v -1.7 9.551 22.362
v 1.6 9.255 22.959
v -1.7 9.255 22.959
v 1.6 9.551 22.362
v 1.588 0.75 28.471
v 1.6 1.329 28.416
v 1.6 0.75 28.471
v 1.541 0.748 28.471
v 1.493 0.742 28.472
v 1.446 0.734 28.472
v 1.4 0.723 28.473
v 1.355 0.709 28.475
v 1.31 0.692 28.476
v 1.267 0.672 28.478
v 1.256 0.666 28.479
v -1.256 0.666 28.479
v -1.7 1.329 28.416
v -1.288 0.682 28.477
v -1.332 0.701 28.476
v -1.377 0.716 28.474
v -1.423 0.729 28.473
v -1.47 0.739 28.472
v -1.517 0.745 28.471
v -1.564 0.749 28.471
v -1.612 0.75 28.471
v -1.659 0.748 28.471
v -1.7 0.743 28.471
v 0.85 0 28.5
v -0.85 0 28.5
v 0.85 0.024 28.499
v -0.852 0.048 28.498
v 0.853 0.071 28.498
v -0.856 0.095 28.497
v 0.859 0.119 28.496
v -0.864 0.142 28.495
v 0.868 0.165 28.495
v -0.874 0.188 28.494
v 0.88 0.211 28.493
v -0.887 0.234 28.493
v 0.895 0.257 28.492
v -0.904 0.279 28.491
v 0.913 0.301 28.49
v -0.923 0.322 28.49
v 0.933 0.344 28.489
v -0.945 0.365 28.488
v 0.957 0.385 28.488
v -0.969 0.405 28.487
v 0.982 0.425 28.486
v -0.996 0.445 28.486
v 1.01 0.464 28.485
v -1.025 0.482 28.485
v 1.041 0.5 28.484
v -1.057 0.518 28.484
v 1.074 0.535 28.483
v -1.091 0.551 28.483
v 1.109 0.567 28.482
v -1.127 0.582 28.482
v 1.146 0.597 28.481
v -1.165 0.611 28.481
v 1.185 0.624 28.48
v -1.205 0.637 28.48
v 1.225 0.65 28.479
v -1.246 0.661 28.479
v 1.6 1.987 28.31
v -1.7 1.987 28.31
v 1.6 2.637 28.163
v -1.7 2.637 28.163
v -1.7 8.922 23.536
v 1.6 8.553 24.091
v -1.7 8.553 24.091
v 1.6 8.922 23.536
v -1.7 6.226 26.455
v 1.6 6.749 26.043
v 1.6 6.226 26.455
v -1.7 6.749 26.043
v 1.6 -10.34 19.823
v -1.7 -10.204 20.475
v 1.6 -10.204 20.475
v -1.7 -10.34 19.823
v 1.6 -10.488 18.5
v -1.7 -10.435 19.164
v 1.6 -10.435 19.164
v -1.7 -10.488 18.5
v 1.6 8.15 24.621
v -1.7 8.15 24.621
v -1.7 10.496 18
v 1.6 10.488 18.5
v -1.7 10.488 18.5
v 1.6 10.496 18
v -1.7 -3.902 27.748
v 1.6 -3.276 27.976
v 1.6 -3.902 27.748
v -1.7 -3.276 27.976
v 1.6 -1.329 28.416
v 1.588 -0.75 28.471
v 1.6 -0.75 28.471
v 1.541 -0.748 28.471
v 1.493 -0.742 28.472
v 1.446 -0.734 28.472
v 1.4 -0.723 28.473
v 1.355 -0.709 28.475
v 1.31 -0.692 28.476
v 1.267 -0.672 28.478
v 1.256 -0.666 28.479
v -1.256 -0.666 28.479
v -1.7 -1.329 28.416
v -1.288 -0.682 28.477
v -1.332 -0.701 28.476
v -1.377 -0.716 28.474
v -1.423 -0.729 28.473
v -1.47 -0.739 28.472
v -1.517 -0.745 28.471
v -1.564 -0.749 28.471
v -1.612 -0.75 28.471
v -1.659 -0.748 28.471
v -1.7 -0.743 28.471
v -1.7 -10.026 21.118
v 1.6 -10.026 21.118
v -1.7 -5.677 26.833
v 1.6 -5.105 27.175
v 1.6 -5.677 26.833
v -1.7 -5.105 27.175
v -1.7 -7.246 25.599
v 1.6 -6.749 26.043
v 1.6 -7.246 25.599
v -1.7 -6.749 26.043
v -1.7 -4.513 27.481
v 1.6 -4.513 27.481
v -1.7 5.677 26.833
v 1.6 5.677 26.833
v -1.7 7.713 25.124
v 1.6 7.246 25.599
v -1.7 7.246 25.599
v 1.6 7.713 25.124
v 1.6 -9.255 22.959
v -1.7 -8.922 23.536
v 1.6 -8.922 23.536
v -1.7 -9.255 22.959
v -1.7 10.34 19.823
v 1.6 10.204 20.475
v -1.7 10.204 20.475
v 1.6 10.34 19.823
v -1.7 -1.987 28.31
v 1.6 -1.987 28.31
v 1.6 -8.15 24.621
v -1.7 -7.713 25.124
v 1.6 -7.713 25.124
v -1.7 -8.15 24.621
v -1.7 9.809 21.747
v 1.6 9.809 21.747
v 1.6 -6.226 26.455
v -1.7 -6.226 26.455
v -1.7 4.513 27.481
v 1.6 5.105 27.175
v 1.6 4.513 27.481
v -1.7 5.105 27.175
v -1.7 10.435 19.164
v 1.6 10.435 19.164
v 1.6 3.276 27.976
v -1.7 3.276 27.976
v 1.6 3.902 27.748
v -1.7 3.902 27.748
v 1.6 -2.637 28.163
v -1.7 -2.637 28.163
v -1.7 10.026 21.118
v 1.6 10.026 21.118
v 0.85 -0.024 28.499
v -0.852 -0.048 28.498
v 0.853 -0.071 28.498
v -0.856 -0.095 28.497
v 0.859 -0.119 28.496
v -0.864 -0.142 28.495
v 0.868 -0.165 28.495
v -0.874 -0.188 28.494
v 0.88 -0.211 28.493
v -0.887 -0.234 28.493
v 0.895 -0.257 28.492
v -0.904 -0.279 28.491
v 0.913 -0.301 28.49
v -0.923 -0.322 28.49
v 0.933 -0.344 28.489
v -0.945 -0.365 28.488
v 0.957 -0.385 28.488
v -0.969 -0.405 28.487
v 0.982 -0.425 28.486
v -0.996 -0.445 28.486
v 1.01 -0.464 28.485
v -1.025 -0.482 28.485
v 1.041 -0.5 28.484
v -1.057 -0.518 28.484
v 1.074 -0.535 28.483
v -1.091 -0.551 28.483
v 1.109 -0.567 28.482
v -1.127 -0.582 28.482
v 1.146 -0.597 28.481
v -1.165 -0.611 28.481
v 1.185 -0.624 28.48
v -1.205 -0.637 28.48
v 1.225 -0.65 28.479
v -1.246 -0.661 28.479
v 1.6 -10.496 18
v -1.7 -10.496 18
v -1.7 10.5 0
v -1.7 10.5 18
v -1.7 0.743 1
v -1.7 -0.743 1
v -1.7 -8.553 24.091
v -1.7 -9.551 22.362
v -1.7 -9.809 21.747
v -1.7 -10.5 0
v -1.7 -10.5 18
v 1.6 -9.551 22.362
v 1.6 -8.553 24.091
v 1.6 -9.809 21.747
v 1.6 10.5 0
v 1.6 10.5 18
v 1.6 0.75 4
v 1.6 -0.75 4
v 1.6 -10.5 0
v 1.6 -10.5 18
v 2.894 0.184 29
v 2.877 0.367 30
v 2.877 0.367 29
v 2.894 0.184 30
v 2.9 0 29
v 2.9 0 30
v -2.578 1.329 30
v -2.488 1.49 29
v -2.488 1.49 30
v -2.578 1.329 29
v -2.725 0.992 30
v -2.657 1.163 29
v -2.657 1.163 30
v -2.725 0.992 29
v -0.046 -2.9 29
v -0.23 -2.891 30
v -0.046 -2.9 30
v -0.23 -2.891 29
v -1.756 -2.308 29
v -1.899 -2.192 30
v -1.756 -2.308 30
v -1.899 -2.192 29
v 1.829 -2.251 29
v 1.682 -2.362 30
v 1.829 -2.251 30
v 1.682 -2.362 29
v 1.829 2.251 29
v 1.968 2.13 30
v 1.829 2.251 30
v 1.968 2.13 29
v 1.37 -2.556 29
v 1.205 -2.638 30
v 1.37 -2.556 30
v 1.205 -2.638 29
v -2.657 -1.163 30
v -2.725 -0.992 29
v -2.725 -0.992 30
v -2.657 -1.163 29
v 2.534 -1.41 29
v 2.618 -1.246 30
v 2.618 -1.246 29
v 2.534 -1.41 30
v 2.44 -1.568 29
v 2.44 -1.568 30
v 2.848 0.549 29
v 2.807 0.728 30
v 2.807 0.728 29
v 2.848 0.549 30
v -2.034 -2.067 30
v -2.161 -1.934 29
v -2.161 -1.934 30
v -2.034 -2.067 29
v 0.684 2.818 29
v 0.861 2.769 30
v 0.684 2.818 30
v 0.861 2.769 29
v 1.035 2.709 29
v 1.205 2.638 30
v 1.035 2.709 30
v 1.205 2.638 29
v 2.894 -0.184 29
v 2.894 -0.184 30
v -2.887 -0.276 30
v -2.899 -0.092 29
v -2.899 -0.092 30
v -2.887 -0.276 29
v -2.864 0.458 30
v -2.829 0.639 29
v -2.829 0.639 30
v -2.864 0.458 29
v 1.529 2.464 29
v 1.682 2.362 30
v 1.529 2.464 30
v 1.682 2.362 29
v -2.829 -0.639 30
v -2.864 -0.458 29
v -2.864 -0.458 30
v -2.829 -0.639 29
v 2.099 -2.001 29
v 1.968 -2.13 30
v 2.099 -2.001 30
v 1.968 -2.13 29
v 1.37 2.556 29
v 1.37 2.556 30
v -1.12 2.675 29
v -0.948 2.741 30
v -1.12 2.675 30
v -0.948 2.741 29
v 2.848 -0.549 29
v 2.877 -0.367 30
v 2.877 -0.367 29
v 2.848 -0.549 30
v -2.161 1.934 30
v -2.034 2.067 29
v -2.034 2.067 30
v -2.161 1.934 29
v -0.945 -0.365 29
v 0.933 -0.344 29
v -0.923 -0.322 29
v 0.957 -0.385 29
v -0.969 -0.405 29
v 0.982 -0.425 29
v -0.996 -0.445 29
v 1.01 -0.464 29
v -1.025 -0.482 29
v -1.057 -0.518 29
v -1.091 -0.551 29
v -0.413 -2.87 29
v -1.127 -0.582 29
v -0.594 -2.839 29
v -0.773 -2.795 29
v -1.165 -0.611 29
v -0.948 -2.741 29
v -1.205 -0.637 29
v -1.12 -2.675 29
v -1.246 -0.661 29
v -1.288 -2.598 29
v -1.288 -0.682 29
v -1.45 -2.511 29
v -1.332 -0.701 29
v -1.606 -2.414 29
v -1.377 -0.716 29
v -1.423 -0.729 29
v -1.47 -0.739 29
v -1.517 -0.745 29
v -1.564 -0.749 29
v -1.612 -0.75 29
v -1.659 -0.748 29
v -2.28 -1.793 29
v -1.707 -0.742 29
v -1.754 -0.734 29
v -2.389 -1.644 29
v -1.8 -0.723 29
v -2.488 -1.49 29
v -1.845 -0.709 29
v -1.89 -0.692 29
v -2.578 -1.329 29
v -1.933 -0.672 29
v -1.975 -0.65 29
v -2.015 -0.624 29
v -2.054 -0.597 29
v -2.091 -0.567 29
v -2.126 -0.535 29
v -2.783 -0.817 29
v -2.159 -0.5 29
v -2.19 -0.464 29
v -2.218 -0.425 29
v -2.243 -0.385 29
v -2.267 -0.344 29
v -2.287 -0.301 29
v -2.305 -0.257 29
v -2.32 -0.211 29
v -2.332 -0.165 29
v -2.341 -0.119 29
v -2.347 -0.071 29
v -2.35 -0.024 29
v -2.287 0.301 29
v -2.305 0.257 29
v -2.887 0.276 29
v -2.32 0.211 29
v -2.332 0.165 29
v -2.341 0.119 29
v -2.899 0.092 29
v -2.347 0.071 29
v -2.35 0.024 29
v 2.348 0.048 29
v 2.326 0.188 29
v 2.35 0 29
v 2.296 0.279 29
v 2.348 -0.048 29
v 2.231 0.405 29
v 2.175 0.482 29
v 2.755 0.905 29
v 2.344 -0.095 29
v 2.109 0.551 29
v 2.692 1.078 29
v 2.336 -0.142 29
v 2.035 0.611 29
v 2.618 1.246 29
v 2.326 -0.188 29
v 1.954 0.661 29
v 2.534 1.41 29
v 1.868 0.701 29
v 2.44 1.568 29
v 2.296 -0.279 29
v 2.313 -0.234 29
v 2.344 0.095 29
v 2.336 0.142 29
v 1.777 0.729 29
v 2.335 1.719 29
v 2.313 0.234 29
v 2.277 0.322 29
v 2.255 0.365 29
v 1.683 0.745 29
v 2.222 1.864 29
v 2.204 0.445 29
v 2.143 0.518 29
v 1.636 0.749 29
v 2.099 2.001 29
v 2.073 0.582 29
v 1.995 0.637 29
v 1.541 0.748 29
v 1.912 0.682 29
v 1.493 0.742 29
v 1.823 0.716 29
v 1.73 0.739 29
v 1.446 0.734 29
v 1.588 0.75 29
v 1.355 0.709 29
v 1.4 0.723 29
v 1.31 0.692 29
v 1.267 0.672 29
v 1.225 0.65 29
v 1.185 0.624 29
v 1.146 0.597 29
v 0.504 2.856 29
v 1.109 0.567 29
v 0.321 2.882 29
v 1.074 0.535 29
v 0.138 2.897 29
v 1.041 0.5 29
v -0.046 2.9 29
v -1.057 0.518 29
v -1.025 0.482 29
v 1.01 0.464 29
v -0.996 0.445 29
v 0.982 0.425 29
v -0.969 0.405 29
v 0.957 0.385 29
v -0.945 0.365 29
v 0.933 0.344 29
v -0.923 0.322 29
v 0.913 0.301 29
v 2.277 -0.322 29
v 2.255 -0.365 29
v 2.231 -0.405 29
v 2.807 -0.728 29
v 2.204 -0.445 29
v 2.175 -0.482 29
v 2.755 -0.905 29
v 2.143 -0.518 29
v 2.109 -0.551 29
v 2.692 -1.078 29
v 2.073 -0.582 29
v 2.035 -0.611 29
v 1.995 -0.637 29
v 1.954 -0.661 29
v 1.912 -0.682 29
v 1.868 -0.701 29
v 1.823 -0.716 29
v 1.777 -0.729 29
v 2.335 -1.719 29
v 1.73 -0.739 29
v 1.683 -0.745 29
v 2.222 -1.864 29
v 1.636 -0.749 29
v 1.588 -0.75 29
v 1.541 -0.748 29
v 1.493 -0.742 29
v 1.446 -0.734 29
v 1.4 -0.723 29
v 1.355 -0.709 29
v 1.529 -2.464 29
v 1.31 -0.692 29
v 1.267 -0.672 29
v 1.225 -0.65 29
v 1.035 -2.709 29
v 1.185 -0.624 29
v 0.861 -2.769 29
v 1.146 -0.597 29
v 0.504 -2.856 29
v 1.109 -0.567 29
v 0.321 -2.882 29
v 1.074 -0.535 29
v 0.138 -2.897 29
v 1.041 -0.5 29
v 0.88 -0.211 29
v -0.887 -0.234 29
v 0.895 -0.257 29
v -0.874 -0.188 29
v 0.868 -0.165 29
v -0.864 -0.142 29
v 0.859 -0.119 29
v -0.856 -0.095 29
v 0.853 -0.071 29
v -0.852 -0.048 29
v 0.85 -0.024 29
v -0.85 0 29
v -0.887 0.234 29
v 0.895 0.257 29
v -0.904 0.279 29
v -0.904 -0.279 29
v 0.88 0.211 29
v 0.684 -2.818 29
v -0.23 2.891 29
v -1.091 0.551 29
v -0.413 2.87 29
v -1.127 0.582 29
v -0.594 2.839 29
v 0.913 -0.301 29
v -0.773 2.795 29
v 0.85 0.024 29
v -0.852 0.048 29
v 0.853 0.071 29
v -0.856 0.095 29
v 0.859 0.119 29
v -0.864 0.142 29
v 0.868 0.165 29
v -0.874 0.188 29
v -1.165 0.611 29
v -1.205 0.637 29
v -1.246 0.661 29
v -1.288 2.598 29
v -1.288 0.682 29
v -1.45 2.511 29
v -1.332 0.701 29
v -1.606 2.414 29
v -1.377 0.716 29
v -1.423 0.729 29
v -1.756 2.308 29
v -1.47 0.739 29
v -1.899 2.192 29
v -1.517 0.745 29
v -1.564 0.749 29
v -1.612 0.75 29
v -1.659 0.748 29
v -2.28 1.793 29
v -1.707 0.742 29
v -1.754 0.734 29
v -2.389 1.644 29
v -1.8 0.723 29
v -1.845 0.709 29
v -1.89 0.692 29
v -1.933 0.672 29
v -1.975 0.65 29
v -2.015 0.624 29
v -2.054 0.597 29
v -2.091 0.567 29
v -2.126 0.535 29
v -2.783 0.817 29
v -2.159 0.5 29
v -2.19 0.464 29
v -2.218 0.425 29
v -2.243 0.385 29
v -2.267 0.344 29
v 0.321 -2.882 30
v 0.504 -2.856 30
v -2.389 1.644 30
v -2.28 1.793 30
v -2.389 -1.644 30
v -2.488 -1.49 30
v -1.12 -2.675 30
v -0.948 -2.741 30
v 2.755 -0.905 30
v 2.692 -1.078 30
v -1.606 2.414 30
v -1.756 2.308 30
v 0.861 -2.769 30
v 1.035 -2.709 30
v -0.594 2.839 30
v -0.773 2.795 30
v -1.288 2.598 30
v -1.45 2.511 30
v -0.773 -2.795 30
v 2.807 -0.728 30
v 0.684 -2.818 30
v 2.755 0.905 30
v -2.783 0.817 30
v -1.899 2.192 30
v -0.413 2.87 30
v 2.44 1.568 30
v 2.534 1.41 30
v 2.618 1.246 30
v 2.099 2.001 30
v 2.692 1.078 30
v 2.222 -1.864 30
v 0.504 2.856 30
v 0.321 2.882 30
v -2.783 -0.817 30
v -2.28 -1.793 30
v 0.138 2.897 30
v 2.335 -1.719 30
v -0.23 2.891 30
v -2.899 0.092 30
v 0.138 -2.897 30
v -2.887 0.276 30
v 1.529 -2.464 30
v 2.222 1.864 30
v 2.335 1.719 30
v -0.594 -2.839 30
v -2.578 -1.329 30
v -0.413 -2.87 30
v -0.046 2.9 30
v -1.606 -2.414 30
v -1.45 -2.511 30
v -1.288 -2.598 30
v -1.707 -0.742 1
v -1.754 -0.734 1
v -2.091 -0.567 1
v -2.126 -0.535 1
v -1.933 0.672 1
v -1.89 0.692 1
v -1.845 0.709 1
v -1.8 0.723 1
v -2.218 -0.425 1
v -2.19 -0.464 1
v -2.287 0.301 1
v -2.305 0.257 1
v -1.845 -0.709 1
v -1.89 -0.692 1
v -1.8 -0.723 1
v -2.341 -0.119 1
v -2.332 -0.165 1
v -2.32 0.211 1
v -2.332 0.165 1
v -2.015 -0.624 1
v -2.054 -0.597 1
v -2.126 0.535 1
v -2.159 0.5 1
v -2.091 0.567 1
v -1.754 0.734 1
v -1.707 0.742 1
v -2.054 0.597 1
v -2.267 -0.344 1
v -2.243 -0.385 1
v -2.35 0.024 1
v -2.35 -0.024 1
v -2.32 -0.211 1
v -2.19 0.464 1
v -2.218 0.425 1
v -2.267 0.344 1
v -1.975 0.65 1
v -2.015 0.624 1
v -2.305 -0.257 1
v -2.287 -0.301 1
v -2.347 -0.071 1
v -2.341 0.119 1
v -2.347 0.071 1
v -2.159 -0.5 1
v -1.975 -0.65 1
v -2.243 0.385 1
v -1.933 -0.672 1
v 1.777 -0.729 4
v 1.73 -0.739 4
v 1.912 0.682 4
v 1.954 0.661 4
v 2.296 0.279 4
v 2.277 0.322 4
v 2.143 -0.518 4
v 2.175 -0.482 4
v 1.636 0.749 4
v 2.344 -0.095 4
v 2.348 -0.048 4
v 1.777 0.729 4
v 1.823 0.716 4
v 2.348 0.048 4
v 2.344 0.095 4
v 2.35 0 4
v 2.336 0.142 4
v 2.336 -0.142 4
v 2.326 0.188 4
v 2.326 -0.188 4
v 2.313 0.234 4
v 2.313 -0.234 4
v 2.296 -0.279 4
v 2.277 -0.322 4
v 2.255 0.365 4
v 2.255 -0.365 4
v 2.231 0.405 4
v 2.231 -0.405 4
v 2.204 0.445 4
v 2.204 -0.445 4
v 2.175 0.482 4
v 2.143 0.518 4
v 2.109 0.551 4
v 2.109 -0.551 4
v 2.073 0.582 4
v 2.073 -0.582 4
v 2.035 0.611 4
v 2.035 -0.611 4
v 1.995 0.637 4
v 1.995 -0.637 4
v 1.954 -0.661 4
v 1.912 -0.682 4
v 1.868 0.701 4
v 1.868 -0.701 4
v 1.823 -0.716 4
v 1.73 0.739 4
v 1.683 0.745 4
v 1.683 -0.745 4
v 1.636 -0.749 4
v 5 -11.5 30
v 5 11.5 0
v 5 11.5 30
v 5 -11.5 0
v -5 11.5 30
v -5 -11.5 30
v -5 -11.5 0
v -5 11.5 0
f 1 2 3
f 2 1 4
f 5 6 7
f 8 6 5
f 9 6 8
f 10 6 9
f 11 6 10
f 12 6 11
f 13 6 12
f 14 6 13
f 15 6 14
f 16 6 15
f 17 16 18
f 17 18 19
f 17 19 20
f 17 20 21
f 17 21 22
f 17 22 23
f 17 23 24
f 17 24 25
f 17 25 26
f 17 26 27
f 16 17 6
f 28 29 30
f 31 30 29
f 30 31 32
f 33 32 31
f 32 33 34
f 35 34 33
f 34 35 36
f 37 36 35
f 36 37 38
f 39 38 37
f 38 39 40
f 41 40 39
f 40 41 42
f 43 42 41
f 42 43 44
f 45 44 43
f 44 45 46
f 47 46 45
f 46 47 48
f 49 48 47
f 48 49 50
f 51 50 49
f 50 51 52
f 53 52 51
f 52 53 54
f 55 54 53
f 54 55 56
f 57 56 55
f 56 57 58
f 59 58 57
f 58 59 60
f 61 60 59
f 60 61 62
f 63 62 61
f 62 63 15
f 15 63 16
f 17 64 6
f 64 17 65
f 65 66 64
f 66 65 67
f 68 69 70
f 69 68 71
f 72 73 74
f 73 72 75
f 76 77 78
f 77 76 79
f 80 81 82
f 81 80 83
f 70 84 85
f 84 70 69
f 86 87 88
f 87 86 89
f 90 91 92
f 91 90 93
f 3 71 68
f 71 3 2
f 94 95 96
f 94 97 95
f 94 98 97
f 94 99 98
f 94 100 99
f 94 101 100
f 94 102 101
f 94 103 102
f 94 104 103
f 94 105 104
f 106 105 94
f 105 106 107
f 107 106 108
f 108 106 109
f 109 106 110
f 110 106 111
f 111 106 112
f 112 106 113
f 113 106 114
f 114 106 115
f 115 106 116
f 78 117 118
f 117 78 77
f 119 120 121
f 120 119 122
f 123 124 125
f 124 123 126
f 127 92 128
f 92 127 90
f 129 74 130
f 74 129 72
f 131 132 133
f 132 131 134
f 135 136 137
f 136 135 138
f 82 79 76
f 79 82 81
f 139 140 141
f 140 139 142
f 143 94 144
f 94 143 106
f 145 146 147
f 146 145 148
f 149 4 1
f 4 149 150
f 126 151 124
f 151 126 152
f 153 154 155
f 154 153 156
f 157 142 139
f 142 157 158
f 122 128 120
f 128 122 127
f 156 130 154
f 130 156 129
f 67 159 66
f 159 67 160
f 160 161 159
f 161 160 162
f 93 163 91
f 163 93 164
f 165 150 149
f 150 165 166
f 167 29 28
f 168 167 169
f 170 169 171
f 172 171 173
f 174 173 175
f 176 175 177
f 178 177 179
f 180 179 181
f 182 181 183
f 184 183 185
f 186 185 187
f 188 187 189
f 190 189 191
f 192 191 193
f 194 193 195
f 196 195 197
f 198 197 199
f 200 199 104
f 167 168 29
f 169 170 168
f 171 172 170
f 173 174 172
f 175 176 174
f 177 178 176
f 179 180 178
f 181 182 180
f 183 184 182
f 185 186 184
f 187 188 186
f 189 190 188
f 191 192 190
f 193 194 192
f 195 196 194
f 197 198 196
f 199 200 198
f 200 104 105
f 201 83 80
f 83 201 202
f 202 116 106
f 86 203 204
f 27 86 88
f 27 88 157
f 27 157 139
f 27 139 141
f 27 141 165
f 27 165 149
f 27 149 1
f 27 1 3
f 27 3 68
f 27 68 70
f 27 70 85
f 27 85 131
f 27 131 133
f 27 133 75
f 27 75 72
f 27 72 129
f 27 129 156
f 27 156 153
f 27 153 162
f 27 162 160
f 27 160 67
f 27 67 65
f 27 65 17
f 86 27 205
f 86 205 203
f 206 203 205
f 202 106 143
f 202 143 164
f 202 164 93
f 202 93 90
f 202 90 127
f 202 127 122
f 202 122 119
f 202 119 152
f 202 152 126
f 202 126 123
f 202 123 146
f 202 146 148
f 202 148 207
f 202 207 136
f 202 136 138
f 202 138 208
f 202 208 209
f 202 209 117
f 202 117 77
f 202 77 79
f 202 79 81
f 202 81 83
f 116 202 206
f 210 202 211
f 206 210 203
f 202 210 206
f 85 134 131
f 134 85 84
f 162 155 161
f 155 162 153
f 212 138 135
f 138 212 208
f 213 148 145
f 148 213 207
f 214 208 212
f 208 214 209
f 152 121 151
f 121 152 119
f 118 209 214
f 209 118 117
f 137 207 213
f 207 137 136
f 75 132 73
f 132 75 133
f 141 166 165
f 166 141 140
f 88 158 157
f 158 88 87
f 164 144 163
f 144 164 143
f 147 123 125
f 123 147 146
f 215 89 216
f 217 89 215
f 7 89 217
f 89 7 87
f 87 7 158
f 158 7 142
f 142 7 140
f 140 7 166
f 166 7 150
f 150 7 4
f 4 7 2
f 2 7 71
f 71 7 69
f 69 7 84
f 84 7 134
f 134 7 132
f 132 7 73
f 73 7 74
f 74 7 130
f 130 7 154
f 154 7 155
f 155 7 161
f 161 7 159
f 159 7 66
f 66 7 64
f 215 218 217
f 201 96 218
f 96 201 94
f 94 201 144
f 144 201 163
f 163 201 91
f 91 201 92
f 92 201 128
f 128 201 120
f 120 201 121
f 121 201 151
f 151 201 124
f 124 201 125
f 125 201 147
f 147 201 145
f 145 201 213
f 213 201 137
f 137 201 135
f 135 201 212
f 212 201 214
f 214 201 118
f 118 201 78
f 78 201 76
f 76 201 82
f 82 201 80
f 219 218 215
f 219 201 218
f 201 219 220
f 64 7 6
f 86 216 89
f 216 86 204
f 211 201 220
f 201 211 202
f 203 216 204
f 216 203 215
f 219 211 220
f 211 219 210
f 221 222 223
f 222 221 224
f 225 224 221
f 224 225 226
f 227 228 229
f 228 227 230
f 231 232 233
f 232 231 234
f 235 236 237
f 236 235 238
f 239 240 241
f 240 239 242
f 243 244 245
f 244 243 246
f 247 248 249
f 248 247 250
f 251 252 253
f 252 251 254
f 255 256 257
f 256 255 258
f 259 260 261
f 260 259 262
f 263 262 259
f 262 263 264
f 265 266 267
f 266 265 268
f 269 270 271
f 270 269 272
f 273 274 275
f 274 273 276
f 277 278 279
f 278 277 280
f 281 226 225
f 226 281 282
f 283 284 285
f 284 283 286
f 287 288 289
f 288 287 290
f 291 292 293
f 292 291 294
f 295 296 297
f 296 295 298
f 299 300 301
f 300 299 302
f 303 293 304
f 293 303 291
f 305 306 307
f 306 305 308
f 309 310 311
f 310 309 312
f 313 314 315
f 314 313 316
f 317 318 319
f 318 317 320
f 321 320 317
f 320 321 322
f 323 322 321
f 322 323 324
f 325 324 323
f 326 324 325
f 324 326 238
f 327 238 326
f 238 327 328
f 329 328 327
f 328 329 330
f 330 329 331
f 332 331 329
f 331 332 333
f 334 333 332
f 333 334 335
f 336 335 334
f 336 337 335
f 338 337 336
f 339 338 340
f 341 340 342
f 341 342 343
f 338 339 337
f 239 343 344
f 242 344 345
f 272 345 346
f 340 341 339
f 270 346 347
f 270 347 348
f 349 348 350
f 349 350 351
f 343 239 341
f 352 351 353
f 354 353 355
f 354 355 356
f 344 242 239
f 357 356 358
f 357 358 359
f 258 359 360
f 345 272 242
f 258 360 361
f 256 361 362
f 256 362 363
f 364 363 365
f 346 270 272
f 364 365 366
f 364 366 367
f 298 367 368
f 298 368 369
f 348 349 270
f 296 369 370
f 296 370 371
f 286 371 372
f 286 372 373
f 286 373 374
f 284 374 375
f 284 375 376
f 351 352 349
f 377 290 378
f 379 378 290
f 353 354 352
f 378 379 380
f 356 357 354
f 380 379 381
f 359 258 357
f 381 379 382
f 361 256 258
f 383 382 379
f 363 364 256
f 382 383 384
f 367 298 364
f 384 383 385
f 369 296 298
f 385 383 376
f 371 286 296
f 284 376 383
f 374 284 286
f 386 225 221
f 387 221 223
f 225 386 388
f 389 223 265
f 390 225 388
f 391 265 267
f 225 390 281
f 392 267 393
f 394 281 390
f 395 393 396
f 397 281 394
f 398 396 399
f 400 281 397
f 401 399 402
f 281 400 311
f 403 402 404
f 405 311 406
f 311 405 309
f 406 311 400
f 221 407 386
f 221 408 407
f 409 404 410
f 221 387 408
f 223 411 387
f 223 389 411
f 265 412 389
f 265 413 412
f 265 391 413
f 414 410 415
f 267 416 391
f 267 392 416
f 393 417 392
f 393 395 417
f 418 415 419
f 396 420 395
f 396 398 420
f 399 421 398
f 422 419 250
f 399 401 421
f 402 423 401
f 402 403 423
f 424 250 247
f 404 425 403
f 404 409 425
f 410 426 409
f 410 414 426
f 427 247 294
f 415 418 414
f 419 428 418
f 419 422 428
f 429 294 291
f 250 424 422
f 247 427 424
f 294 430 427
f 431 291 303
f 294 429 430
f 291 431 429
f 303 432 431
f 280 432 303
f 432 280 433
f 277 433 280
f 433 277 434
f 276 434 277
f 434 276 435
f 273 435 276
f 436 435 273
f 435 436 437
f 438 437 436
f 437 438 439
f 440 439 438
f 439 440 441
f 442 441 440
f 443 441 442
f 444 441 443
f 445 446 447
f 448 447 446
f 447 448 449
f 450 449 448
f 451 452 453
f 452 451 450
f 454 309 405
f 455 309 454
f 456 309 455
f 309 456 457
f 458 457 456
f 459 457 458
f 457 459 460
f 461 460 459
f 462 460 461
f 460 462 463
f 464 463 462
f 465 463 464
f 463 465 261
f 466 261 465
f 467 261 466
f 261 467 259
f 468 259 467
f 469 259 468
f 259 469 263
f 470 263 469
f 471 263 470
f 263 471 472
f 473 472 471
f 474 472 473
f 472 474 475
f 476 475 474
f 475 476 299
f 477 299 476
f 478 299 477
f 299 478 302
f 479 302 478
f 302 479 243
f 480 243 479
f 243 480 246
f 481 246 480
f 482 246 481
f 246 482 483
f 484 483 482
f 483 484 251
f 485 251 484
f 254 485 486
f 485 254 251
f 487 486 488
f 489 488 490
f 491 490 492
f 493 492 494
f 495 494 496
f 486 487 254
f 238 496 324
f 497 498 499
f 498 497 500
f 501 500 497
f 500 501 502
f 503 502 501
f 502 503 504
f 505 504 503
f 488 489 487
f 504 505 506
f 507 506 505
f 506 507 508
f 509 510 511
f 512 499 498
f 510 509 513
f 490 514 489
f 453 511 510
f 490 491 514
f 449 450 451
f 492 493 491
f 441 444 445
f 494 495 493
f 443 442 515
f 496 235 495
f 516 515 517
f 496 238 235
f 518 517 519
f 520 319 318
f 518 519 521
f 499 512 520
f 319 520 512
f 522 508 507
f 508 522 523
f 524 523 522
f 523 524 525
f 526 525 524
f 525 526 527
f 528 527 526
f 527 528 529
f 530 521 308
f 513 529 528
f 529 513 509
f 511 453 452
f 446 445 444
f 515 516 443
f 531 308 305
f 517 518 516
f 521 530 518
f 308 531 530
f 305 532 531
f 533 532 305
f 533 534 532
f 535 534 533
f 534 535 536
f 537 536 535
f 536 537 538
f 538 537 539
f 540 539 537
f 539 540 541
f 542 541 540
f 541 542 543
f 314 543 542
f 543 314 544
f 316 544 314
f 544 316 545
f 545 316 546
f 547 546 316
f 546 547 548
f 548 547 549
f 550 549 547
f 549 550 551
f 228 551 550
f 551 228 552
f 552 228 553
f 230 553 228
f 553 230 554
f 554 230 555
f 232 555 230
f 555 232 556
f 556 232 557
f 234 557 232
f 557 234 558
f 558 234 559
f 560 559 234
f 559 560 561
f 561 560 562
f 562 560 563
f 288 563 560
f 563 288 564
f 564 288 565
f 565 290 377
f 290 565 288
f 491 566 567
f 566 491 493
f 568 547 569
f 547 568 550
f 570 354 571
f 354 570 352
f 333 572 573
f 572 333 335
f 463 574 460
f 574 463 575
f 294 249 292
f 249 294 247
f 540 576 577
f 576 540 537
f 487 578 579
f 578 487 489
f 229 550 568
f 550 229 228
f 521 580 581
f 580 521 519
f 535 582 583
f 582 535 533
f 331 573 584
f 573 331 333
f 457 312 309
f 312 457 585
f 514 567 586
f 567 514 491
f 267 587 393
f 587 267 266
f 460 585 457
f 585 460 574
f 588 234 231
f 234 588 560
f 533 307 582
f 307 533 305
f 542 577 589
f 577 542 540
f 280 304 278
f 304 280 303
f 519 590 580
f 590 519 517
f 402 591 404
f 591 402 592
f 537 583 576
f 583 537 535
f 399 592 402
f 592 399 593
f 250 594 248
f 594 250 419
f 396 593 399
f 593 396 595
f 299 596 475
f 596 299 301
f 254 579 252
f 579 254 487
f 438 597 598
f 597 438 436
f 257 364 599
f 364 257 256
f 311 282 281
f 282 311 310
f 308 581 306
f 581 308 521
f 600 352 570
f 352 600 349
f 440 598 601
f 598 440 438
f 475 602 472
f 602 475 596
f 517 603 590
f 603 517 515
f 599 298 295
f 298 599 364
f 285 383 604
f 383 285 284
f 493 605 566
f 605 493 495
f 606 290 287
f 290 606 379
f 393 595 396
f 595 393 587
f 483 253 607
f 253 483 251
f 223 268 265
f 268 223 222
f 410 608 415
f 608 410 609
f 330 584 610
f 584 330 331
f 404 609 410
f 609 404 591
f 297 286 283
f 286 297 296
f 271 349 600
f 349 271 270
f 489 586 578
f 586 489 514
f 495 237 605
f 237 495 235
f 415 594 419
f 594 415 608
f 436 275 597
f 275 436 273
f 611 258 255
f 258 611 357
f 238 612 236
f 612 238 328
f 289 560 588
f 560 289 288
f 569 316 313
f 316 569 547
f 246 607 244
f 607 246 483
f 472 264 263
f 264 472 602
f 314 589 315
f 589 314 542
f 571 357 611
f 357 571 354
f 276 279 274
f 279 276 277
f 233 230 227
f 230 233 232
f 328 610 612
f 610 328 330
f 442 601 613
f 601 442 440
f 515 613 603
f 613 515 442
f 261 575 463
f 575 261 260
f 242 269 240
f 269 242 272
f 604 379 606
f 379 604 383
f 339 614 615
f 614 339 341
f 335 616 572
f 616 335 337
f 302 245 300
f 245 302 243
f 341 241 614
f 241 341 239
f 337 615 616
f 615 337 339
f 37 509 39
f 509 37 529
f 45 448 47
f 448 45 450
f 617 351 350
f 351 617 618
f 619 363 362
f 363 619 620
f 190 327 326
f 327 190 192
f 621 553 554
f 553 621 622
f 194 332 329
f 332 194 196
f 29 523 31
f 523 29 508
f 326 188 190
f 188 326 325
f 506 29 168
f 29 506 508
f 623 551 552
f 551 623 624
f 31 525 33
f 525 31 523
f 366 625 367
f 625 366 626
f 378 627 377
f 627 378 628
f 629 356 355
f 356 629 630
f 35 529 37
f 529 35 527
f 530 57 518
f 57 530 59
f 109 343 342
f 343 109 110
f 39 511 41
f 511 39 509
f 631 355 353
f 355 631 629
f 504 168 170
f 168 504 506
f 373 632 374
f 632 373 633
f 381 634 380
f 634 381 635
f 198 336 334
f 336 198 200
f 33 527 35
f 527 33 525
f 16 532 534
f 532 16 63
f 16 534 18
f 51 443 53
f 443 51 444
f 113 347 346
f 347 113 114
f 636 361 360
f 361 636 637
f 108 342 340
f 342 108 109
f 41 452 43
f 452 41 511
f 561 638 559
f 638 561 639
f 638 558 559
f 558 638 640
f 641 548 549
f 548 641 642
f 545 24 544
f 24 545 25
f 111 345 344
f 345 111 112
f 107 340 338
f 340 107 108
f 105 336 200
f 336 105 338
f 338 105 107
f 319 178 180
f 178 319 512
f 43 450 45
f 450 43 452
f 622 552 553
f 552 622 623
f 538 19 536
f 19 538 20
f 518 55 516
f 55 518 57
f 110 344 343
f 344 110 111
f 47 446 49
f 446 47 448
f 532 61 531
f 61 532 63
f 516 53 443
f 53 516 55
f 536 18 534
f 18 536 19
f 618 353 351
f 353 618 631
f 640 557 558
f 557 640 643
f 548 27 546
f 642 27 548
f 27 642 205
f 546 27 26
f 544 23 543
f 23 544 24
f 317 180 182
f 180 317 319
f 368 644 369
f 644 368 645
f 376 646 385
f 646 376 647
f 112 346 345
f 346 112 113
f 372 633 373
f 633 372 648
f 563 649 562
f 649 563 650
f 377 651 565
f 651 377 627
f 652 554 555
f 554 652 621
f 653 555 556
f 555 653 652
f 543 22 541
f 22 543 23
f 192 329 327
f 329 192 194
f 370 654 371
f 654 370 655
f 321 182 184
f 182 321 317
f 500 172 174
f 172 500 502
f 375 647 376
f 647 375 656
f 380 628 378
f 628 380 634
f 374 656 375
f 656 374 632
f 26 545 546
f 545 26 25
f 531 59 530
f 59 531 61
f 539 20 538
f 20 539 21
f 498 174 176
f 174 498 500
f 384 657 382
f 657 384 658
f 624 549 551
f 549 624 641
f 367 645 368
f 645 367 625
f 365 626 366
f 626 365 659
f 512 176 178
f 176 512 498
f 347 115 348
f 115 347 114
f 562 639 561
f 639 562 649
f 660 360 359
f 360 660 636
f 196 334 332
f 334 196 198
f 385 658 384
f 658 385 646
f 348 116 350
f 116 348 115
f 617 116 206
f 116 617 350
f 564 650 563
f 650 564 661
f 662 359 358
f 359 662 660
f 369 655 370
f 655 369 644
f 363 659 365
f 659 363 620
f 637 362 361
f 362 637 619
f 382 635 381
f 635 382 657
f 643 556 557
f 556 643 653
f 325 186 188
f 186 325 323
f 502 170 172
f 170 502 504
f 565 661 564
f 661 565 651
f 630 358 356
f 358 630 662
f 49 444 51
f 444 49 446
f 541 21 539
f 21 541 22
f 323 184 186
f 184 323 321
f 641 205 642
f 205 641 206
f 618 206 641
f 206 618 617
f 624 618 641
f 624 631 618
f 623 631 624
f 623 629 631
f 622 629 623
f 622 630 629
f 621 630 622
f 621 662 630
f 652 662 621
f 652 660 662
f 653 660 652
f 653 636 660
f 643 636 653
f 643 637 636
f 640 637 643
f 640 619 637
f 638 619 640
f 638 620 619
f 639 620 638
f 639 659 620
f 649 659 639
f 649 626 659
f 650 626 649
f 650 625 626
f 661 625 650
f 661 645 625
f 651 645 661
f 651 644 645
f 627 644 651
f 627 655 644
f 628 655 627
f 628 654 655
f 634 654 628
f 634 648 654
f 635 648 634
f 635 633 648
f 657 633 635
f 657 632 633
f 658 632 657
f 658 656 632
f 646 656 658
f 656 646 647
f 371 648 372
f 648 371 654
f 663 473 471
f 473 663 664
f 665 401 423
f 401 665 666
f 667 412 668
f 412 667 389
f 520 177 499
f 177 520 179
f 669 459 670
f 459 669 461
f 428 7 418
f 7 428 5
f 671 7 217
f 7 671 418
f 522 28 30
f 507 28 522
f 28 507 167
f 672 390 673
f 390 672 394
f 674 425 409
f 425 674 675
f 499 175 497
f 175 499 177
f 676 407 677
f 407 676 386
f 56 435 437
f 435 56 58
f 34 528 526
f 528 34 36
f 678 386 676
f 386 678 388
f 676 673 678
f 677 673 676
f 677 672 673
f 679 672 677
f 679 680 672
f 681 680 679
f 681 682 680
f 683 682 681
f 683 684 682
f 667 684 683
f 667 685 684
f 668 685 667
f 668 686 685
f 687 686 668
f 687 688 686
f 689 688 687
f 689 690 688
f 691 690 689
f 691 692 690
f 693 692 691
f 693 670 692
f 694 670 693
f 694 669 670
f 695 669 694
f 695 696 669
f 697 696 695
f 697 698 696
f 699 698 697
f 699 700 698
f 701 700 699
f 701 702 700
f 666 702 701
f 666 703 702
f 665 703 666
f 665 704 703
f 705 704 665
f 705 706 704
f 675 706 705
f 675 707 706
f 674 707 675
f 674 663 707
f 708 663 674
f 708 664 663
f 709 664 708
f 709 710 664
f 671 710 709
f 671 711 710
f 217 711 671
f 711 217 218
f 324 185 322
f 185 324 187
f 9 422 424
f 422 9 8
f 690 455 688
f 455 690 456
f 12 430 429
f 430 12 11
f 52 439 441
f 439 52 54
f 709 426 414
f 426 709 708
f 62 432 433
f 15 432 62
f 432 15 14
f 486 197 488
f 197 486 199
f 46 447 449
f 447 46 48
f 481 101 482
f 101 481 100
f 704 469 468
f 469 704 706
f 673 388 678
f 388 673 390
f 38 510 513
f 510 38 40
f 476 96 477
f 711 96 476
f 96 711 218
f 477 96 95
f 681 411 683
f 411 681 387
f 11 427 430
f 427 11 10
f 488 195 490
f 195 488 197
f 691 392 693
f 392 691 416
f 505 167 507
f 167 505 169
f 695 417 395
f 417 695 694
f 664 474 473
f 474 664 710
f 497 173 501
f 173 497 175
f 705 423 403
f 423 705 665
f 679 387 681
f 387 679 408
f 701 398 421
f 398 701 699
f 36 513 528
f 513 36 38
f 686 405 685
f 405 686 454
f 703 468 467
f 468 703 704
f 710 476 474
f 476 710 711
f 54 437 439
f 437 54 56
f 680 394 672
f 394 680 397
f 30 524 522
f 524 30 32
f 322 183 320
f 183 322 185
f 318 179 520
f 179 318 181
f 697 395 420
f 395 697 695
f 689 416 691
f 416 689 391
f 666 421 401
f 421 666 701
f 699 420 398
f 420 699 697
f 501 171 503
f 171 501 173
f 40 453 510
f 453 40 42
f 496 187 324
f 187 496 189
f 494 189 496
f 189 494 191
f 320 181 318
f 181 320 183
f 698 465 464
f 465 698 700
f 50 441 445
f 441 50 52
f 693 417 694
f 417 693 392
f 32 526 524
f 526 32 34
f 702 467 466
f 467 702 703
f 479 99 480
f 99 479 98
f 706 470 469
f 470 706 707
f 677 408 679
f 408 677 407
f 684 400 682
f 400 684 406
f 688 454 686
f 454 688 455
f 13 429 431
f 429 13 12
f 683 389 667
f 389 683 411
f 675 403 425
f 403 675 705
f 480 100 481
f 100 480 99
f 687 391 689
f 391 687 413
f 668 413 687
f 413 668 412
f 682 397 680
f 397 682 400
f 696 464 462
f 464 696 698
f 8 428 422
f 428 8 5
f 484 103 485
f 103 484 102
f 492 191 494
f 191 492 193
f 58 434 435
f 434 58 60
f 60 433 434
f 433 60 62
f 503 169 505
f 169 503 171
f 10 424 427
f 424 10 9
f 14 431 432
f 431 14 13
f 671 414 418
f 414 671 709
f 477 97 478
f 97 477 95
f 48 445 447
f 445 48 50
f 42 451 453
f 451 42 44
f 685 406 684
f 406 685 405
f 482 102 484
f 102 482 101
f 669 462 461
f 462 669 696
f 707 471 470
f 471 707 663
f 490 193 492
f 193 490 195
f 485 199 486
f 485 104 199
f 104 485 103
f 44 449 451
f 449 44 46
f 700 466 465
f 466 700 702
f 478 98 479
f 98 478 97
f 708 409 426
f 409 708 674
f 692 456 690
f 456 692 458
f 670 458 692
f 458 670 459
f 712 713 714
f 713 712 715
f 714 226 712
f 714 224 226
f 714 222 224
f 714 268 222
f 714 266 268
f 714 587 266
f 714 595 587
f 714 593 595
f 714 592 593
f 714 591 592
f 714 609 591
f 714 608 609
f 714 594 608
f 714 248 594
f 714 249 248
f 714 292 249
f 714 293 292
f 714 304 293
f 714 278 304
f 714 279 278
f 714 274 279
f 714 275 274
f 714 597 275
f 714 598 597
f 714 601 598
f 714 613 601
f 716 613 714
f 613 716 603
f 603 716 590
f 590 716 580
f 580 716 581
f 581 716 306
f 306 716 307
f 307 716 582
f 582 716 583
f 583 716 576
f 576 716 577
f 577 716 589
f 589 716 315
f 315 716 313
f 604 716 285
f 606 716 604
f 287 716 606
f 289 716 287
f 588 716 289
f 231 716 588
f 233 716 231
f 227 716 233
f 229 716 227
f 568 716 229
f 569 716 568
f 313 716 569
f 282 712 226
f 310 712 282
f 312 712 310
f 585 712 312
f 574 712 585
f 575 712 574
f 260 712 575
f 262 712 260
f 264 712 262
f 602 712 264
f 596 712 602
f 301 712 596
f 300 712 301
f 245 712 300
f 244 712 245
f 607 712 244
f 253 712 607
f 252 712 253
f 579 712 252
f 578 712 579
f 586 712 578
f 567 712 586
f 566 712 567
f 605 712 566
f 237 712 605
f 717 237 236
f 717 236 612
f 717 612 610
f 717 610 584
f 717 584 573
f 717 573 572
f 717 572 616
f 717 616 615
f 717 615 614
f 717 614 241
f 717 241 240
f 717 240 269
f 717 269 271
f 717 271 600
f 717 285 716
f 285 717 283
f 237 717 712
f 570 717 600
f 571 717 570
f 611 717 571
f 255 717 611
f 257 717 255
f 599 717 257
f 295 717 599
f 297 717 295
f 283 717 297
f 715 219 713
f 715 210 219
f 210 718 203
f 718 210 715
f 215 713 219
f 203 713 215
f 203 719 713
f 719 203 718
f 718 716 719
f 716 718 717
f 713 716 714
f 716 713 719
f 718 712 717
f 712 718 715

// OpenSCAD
/*
 * Throwie model for embedding in things, or as a simple holder
 * for a CR2032 Coin cell with a 5MM LED on it. (LED throwie)
 * subtract throwie(center_height) from your model. Center Height is 
 * the height of the center of the battery.
 */
 
//battery cutout with square bottom for insertion
// note: -2mm added to poke through the bottom.
module cr2032(center_height){
    translate([1.6,0,center_height])rotate([0,270,0])union(){
        cylinder(r=10.5,h=3.3);
        translate([-center_height-2,-10.5,0])cube([center_height+2,21,3.3]);
    }
}
// throwie cutout for embedding in other models
module throwie(center_height,embed=false)
{
    $fn=99;
    union(){
        cr2032(center_height);
        5mmLED(center_height);
    }
}
// positive lead 28mm
// negative lead 25mm
module 5mmLED(center_height){
        $fn=99;
        translate([0,0,center_height+11])cylinder(r=5.8/2,h=8.3-(5.8/2),$fn=99);
        translate([0,0,center_height+11+8.3-(5.8/2)])sphere(5.8/2);
        translate([-1.6,0,center_height+11-28])cylinder(r=.75,h=28);
        translate([1.6,0,center_height+11-25])cylinder(r=.75,h=25);
}
//test holder
module test_holder(){
    base_x =10;
    base_y = 23;
    base_h = 30;
    difference(){
        translate([-base_x/2,-base_y/2,0])cube([base_x,base_y,base_h]);
        throwie((base_h/2)+3);
    }
}
//note that this requires http://www.thingiverse.com/thing:8896
module octo_led(){
    difference(){
        translate([0,0,3])import("OctopusThickLegs.stl");
        translate([0,8.5,0])throwie(14);
    }
}
test_holder();
//5mmLED((30/2)+3);
//throwie(15);
//octo_led();

